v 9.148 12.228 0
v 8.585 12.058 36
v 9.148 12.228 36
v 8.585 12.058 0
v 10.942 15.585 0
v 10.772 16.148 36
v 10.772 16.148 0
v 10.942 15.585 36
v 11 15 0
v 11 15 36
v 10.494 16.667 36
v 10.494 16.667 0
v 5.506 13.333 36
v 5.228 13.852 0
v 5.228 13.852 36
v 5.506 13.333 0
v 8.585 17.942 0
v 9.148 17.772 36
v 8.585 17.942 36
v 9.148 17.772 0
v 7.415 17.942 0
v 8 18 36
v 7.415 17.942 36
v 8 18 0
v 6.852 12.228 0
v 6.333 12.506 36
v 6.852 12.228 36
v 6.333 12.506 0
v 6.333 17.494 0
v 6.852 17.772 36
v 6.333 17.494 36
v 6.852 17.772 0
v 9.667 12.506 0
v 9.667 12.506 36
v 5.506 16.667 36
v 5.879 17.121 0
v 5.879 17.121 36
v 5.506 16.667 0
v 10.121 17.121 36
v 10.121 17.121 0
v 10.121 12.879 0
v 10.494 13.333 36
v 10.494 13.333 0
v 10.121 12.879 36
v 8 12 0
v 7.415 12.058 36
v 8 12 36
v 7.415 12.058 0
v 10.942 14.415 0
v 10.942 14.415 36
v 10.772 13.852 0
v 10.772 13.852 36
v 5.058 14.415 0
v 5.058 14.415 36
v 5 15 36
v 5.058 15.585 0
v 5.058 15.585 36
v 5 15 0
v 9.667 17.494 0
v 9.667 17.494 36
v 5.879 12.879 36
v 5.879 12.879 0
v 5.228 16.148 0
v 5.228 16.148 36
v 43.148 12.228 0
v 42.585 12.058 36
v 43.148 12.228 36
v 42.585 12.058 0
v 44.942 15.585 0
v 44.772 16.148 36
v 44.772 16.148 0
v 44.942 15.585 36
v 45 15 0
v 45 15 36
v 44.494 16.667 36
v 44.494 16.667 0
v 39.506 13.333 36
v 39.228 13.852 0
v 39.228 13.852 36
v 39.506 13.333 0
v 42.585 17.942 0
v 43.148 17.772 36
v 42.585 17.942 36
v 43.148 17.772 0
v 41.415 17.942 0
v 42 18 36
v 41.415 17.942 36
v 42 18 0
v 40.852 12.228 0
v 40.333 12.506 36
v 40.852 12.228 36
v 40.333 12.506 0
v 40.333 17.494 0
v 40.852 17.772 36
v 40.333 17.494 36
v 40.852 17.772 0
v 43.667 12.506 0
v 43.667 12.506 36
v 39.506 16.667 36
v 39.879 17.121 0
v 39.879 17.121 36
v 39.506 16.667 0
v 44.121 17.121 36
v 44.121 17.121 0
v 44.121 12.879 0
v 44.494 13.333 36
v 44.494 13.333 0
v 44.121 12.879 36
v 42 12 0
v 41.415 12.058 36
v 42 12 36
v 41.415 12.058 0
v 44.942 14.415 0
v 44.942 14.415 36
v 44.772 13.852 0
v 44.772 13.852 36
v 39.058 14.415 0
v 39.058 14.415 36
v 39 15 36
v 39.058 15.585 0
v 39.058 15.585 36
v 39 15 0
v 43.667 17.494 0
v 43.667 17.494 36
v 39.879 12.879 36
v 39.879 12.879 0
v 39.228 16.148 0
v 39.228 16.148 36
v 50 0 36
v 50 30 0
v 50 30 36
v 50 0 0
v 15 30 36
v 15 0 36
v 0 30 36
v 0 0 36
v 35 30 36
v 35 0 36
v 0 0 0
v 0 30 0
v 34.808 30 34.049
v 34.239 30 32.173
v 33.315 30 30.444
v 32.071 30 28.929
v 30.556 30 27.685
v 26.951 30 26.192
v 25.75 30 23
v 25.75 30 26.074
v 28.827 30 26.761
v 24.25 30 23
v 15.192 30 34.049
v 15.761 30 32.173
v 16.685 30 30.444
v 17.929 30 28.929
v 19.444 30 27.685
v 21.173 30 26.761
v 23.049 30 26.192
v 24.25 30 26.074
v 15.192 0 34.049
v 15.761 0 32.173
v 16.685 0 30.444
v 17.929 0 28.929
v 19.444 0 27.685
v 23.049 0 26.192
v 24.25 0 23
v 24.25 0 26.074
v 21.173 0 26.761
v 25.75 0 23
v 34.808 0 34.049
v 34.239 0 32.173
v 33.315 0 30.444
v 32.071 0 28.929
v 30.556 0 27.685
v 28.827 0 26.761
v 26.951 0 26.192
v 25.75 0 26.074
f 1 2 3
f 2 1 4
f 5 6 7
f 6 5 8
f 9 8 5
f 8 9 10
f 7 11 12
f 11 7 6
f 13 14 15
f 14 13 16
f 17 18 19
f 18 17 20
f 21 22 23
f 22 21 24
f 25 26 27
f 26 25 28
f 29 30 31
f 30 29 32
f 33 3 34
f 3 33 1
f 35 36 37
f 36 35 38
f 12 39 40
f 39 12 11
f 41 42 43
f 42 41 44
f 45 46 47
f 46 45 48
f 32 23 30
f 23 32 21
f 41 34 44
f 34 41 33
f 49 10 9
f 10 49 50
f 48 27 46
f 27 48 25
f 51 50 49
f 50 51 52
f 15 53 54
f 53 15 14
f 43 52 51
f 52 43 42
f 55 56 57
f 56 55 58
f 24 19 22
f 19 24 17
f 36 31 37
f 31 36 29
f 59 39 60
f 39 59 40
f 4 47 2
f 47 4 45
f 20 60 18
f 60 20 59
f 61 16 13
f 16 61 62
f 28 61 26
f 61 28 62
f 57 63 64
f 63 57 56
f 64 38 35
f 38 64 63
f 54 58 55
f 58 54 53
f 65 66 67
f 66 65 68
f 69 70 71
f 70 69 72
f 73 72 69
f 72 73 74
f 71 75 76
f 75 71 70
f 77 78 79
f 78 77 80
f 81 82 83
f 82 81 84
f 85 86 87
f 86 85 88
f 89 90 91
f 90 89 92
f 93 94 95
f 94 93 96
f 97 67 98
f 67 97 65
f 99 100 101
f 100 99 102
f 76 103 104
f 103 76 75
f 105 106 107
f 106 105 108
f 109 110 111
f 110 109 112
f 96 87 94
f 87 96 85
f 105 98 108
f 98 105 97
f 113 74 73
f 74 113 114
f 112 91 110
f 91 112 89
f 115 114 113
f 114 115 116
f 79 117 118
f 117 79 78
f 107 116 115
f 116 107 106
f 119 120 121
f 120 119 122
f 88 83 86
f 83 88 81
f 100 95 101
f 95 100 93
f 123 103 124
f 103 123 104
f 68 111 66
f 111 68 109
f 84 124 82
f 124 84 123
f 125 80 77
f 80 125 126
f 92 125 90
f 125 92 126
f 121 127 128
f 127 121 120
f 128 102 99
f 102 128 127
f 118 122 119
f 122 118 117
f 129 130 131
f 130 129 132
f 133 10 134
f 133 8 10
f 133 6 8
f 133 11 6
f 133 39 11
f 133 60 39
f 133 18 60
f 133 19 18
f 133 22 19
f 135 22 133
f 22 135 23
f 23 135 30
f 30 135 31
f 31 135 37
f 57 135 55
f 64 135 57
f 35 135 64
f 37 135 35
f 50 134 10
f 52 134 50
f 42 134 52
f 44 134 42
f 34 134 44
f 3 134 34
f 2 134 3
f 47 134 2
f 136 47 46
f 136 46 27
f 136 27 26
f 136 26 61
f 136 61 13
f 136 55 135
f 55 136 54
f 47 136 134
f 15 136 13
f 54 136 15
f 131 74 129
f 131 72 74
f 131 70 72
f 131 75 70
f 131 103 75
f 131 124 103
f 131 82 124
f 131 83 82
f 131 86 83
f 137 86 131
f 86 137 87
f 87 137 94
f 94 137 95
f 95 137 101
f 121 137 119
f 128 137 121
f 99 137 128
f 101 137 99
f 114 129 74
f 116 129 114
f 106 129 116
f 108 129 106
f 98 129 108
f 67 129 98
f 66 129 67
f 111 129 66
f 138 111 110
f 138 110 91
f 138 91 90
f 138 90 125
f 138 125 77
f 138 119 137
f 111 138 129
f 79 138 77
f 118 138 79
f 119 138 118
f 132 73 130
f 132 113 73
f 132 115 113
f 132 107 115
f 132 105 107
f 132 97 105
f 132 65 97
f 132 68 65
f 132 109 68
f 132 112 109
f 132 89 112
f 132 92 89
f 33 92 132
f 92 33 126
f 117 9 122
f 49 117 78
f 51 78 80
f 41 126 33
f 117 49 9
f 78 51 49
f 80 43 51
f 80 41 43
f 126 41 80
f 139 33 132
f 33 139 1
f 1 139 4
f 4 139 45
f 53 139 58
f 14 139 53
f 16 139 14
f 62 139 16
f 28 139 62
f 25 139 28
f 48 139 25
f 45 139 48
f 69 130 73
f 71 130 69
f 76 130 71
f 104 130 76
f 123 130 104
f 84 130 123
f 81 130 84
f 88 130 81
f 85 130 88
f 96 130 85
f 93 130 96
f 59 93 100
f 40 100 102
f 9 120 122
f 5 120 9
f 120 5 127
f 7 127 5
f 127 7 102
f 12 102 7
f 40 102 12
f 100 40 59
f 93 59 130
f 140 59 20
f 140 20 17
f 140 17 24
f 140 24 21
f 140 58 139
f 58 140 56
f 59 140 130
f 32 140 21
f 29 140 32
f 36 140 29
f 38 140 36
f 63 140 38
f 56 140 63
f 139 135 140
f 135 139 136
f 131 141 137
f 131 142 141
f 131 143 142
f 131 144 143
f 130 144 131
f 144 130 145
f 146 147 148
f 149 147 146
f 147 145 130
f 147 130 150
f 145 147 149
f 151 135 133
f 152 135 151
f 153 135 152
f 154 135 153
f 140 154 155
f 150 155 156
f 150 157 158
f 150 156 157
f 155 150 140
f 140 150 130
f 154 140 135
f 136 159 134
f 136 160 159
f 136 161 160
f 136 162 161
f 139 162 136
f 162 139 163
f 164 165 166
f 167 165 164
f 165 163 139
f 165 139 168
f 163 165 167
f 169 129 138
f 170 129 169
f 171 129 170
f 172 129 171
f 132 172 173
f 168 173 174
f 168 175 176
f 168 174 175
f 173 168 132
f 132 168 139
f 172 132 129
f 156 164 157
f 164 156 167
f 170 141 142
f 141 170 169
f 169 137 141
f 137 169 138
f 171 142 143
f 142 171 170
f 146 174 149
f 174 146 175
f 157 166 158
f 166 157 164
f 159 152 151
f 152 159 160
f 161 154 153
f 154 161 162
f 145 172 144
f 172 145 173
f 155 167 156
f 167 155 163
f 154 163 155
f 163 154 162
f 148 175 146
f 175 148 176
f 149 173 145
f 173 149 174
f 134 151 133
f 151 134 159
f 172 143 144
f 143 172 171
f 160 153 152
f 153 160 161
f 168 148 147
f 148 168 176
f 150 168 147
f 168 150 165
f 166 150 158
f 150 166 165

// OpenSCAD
$fn = 32;

// ----------------------------------------------------------------------
// Saddle clamp: split shaft clamp
// ----------------------------------------------------------------------

// --- parameters (mm) ---
blk_l = 50;               // block length, X
blk_w = 30;               // block width, Y
blk_h = 36;               // block height
clamp_r = 10;             // shaft groove radius
hole_r = 3;               // bolt hole radius
hole_m = 8;               // bolt hole margin from the ends
saw_w = 1.5;              // saw kerf width

saw_depth = clamp_r + 3;  // saw kerf depth

difference() {
  cube([blk_l, blk_w, blk_h]);
  translate([blk_l / 2, -1, blk_h])
    rotate([-90, 0, 0])
      cylinder(h = blk_w + 2, r = clamp_r);
  for (sx = [0, 1])
    translate([sx ? blk_l - hole_m : hole_m, blk_w / 2, -1])
      cylinder(r = hole_r, h = blk_h + 2);
  translate([blk_l / 2 - saw_w / 2, -1, blk_h - saw_depth])
    cube([saw_w, blk_w + 2, saw_depth + 1]);
}
